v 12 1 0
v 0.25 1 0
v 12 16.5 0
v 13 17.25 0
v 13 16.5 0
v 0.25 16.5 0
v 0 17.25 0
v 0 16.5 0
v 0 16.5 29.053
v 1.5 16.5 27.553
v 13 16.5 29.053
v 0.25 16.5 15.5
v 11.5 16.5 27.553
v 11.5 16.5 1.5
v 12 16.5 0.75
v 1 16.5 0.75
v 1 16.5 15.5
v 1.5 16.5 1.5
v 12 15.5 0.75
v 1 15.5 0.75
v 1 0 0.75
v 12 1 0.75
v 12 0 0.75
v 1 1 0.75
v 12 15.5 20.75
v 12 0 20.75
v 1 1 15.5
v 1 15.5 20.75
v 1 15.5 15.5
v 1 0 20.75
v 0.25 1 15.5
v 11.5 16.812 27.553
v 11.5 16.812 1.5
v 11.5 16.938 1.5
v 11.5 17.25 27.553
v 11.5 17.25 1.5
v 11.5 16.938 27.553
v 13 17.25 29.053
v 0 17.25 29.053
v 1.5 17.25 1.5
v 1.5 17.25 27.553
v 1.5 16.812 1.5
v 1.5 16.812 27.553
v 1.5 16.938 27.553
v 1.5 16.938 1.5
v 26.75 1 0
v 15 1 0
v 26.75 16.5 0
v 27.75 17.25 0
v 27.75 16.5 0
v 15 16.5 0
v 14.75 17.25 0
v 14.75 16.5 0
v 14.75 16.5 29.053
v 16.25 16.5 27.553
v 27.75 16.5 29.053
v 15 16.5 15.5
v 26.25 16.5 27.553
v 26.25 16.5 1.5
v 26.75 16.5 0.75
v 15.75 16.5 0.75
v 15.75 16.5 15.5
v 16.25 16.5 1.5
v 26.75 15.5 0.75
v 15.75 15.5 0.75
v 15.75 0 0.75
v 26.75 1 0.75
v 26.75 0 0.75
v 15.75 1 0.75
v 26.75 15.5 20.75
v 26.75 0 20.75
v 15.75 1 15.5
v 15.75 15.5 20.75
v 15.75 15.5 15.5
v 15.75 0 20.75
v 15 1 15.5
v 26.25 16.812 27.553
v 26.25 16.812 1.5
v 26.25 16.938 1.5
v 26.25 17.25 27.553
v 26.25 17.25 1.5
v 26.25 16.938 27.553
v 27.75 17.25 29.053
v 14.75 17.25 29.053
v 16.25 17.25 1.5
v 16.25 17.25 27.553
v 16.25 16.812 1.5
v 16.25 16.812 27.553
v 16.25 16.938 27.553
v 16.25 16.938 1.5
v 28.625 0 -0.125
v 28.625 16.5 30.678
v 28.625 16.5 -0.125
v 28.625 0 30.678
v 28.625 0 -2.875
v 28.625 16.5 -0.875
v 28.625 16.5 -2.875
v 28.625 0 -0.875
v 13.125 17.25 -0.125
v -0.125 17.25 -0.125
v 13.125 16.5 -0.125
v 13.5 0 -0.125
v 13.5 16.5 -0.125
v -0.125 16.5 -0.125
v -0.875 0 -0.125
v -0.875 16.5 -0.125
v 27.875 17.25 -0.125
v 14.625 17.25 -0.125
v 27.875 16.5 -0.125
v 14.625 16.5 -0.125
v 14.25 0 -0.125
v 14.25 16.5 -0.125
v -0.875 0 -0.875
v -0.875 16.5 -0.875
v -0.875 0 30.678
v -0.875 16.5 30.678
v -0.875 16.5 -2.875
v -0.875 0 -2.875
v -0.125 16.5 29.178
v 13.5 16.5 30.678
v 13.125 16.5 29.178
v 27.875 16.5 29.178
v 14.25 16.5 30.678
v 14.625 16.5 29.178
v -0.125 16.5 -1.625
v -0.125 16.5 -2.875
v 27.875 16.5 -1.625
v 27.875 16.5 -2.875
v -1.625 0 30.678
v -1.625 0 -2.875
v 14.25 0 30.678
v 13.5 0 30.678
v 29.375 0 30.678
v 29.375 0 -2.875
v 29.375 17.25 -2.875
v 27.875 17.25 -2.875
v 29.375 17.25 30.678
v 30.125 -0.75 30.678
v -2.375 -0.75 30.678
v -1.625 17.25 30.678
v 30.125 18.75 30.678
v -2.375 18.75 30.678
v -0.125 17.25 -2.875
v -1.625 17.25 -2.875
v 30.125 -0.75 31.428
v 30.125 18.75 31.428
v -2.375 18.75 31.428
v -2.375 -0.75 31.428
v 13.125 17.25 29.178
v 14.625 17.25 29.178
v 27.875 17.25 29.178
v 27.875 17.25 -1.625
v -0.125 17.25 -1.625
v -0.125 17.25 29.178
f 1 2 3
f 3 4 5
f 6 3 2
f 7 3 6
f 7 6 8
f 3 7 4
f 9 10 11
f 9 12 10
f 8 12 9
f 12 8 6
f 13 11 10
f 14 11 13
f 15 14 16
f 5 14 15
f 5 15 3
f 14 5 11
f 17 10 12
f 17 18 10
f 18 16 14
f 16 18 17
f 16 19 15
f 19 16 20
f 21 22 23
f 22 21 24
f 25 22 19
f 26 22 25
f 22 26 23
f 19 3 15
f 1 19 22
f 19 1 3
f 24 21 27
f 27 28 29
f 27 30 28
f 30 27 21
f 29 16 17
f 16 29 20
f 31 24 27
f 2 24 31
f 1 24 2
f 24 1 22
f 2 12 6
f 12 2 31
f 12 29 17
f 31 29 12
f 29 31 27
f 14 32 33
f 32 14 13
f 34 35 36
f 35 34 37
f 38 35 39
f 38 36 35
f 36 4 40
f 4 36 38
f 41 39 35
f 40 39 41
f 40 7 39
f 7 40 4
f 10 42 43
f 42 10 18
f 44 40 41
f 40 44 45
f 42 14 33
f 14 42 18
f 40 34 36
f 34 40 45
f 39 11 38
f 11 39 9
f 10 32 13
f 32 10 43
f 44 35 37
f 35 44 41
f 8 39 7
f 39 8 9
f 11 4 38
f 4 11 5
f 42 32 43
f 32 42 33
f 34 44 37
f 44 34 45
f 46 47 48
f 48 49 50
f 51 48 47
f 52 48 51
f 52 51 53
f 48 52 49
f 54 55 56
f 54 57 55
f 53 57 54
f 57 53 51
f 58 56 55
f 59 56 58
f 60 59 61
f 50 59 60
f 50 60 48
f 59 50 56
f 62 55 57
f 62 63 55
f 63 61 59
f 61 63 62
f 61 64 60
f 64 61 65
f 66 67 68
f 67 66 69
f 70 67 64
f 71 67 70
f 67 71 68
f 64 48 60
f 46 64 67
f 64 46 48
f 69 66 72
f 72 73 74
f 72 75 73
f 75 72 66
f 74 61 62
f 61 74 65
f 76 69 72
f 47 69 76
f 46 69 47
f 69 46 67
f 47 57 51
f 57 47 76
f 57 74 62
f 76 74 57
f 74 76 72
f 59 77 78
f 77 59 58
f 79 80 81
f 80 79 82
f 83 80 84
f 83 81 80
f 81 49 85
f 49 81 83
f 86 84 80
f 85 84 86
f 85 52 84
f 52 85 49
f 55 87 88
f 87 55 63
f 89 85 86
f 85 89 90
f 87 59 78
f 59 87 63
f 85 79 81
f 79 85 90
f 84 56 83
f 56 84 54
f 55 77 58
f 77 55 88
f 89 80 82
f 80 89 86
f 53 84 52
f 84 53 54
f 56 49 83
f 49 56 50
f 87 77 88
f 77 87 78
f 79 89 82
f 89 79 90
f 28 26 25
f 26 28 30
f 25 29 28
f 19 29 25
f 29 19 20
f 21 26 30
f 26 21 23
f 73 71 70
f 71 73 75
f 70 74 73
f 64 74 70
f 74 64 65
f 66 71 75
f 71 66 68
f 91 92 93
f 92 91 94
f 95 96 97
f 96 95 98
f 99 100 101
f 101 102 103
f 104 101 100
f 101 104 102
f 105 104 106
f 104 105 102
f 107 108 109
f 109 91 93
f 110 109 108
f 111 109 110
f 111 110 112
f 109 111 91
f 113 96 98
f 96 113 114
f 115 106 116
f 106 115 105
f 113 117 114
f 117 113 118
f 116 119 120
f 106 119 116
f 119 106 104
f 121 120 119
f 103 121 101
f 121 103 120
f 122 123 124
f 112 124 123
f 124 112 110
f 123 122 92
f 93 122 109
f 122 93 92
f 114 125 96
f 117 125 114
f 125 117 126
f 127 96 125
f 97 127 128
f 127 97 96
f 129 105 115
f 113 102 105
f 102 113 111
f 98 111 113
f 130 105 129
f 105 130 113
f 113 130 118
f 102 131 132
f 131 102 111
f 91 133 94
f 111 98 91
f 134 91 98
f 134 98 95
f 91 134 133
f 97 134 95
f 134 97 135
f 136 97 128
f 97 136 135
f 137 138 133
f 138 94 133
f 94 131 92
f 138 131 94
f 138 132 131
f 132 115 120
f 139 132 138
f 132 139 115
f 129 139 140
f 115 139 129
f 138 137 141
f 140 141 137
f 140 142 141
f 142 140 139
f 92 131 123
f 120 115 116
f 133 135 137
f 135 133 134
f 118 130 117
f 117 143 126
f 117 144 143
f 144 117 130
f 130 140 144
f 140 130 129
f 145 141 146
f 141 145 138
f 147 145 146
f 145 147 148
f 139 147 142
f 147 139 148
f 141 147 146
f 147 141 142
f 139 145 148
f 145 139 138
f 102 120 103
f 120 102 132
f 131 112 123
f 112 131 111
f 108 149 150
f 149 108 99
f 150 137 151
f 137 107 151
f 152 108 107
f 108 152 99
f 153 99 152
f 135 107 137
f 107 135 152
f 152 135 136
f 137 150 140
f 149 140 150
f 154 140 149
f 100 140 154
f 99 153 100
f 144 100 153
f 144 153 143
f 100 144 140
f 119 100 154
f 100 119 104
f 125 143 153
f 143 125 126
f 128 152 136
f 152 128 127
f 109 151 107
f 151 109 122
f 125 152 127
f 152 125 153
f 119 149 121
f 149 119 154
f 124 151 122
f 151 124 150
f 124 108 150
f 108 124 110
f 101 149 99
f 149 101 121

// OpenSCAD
module board( size, label = false ) {
    // size[0] is always with the grain.
    // size[1] is against the grain.
    // size[2] is the board thickness.
    
    cube( size = size );
    
    // Output the size of the board for easy cut lists.
    echo( str( size[2], " ", label, ": ", size[0], "x", size[1]));
}

width_of_can = 11;
height_of_can = 20;
depth_of_can = 15.5;
number_of_cans = 2;
bead_board_inset = 1/2;
bead_board_thickness = 1/8;
lid_overhang_front = 1.5;  // Overhang for the lid front
lid_overhang_sides = .75; // Overhang for the lid sides
lid_overhang_back = .75; // Overhang for the back of the lid.

toe_clearance = 2; // Space between the bottom board and the floor.
stock_thickness = 3/4;
cabinet_door_clearance = 1/8;

horizontal_can_clearance = 1;
vertical_can_clearance = 3;
depth_can_clearance = 1; // Space behind cans.

each_can_cabinet_door_width = width_of_can + horizontal_can_clearance + horizontal_can_clearance;

each_can_cabinet_door_height =
    stock_thickness // The base of the tilting door.
    + sqrt( ( height_of_can * height_of_can ) + ( depth_of_can * depth_of_can ) ) // The longest diagonal across the can.
    + vertical_can_clearance // Extra space for clearance and garbage at the top.
    ;

face_frame_width = 1.5;
depth_of_box = depth_of_can + depth_can_clearance;

width_of_horizontal_base =
    (number_of_cans * ( each_can_cabinet_door_width + cabinet_door_clearance + cabinet_door_clearance ) ) // Space for doors and clearance.
    + ((number_of_cans + 1 ) * face_frame_width) // Space for the surrounding face frames
    - stock_thickness - stock_thickness // Minus the width of the end boards.
    ;

translate([0, depth_of_box+stock_thickness, 0]) rotate([-40 * $t, 0, 0]) translate([0, -depth_of_box-stock_thickness, 0]) union() {
    color( "white" ) {
    translate([0, depth_of_box + stock_thickness, 0])
    for (can_number=[0:number_of_cans-1]){
        // Cabinet doors.
        translate([
            ( can_number * ( each_can_cabinet_door_width + cabinet_door_clearance + face_frame_width + cabinet_door_clearance ) ),
            0,
            0
         ])
            rotate([90, 0, 0])
            union() {
                    // Base that holds the can.
        translate([width_of_can + ((each_can_cabinet_door_width - width_of_can) / 2), stock_thickness, stock_thickness]) 
            rotate([0, -90, 90])
            board( [ depth_of_can, width_of_can, stock_thickness], "can base" );
           
                // Base sides
                translate([((each_can_cabinet_door_width - width_of_can) / 2), 0, stock_thickness]) rotate([0, -90, 0]) board( [ depth_of_can, depth_of_box - depth_can_clearance, stock_thickness ], "can sides (combined)" );
            
                // Bottom board.
                translate([face_frame_width, 0, 0])
                    board([ each_can_cabinet_door_width - (face_frame_width * 2), face_frame_width, stock_thickness], "door face frame" );
            
                // Top Board.
                translate([face_frame_width, each_can_cabinet_door_height - face_frame_width, 0])
                    board([ each_can_cabinet_door_width - (face_frame_width * 2), face_frame_width, stock_thickness], "door face frame" );
            
                // Left board.
                translate([face_frame_width, 0, 0] )
                    rotate( [0, 0, 90 ] )
                    board( [ each_can_cabinet_door_height, face_frame_width, stock_thickness ], "door face frame" );
            
                // Right board.
                translate([each_can_cabinet_door_width, 0, 0] )
                    rotate( [0, 0, 90 ] )
                    board( [ each_can_cabinet_door_height, face_frame_width, stock_thickness ], "door face frame" );
            
                // Inset.
                color( "white" ) translate([each_can_cabinet_door_width - face_frame_width + bead_board_inset, face_frame_width - bead_board_inset, ( (stock_thickness - bead_board_thickness ) / 2) ])
                    rotate([0, 0, 90])
                    board([ each_can_cabinet_door_height + ( bead_board_inset * 2 ) - face_frame_width - face_frame_width, each_can_cabinet_door_width + ( bead_board_inset * 2 ) - face_frame_width - face_frame_width, bead_board_thickness], "beadboard" );
    }
}}
    // Mock up the cans.
    color( "orange") for (can_number=[0:number_of_cans-1]) {
        translate([
            ((each_can_cabinet_door_width - width_of_can) / 2)
    
        + (can_number * (each_can_cabinet_door_width + cabinet_door_clearance + cabinet_door_clearance + face_frame_width ) )
    
        ,
            0, stock_thickness
        ])
            cube([width_of_can, depth_of_can, height_of_can]);
    }

}{

// Bottom support board.
color( "white" ) translate([
    -cabinet_door_clearance + stock_thickness - face_frame_width,
    0,
    -stock_thickness - cabinet_door_clearance
    ])
    board( [ width_of_horizontal_base, depth_of_box, stock_thickness ], "box frame (bottom)" );

// Near side.
color( "white" ) translate( [ stock_thickness - cabinet_door_clearance - face_frame_width + width_of_horizontal_base + stock_thickness, 0, -toe_clearance - stock_thickness - cabinet_door_clearance ] )
rotate( [ 0, -90, 0 ] )
    board( [
        toe_clearance + stock_thickness + cabinet_door_clearance + each_can_cabinet_door_height + cabinet_door_clearance + face_frame_width,
        depth_of_box,
        stock_thickness
    ], "box frame" );

// Far side
color( "white" ) translate( [ -cabinet_door_clearance + stock_thickness - face_frame_width, 0, -toe_clearance - stock_thickness - cabinet_door_clearance ] )
rotate( [ 0, -90, 0 ] )
    board( [
        toe_clearance + stock_thickness + cabinet_door_clearance + each_can_cabinet_door_height + cabinet_door_clearance + face_frame_width,
        depth_of_box,
        stock_thickness
    ], "box frame" );

// Top
color( "tan" ) translate([
    -(face_frame_width - stock_thickness) - stock_thickness - lid_overhang_sides - cabinet_door_clearance,
    -lid_overhang_back,
    -stock_thickness - cabinet_door_clearance + cabinet_door_clearance + each_can_cabinet_door_height + cabinet_door_clearance + stock_thickness + face_frame_width
    ])
    board( [ width_of_horizontal_base + stock_thickness + stock_thickness + lid_overhang_sides + lid_overhang_sides, depth_of_box + lid_overhang_front + lid_overhang_back + stock_thickness, stock_thickness ], "box frame top" );
    
// Vertical dividers.
color( "white" ) for (can_number = [0:number_of_cans-2]) {
    translate([
        stock_thickness
        + each_can_cabinet_door_width
        - (stock_thickness/2)
        + ((face_frame_width + cabinet_door_clearance + cabinet_door_clearance)/2)
        // Everything above is to place the first one after the first door.
        // The rest is to shift every next divider over the equivalent number of full door widths.
        + ( 
            can_number *
            (
                each_can_cabinet_door_width
                + cabinet_door_clearance
                + cabinet_door_clearance
                + face_frame_width
            )
        )
        ,
        0,
        -cabinet_door_clearance])
    rotate([0, -90, 0])
        board( [ each_can_cabinet_door_height + cabinet_door_clearance + cabinet_door_clearance + face_frame_width, depth_of_box, stock_thickness ], "box frame (interior vertical)" );
}

// Face frame

// Near stile
color( "white" ) translate([-cabinet_door_clearance - face_frame_width, depth_of_box, -cabinet_door_clearance - stock_thickness - toe_clearance]) 
rotate([0, -90, -90])
    board([toe_clearance + stock_thickness + cabinet_door_clearance + each_can_cabinet_door_height + cabinet_door_clearance + face_frame_width, face_frame_width, stock_thickness], "face frame");

// Far stile
color( "white" ) translate([-cabinet_door_clearance - face_frame_width - ( face_frame_width - stock_thickness) + width_of_horizontal_base + stock_thickness, depth_of_box, -cabinet_door_clearance - stock_thickness - toe_clearance]) 
rotate([0, -90, -90])
    board([toe_clearance + stock_thickness + cabinet_door_clearance + each_can_cabinet_door_height + cabinet_door_clearance + face_frame_width, face_frame_width, stock_thickness], "face frame");

// Bottom rail
color( "white" ) translate([-cabinet_door_clearance, depth_of_box, -cabinet_door_clearance - face_frame_width])
    translate([0, stock_thickness, 0]) rotate([90, 0, 0]) board([width_of_horizontal_base - ((face_frame_width - stock_thickness) * 2), face_frame_width, stock_thickness], "face frame");

// Top rail
color( "white" ) translate([-cabinet_door_clearance, depth_of_box, -cabinet_door_clearance - face_frame_width + each_can_cabinet_door_height + cabinet_door_clearance + cabinet_door_clearance + face_frame_width])
    translate([0, stock_thickness, 0]) rotate([90, 0, 0]) board([width_of_horizontal_base - ((face_frame_width - stock_thickness) * 2), face_frame_width, stock_thickness], "face frame");

// Vertical stiles.
color( "white" ) for (can_number = [0:number_of_cans-2]) {
    translate([
        stock_thickness
        + each_can_cabinet_door_width
        - (stock_thickness/2)
        + ((face_frame_width + cabinet_door_clearance + cabinet_door_clearance)/2)
        - stock_thickness
        - ( ( face_frame_width - stock_thickness ) / 2 )
        // Everything above is to place the first one after the first door.
        // The rest is to shift every next divider over the equivalent number of full door widths.
        + ( 
            can_number *
            (
                each_can_cabinet_door_width
                + cabinet_door_clearance
                + cabinet_door_clearance
                + face_frame_width
            )
        )
        ,
        depth_of_box,
        -cabinet_door_clearance])
    rotate([0, -90, -90])
        board( [ each_can_cabinet_door_height + cabinet_door_clearance + cabinet_door_clearance, face_frame_width, stock_thickness ], "face frame (interior vertical)" );
}
}
